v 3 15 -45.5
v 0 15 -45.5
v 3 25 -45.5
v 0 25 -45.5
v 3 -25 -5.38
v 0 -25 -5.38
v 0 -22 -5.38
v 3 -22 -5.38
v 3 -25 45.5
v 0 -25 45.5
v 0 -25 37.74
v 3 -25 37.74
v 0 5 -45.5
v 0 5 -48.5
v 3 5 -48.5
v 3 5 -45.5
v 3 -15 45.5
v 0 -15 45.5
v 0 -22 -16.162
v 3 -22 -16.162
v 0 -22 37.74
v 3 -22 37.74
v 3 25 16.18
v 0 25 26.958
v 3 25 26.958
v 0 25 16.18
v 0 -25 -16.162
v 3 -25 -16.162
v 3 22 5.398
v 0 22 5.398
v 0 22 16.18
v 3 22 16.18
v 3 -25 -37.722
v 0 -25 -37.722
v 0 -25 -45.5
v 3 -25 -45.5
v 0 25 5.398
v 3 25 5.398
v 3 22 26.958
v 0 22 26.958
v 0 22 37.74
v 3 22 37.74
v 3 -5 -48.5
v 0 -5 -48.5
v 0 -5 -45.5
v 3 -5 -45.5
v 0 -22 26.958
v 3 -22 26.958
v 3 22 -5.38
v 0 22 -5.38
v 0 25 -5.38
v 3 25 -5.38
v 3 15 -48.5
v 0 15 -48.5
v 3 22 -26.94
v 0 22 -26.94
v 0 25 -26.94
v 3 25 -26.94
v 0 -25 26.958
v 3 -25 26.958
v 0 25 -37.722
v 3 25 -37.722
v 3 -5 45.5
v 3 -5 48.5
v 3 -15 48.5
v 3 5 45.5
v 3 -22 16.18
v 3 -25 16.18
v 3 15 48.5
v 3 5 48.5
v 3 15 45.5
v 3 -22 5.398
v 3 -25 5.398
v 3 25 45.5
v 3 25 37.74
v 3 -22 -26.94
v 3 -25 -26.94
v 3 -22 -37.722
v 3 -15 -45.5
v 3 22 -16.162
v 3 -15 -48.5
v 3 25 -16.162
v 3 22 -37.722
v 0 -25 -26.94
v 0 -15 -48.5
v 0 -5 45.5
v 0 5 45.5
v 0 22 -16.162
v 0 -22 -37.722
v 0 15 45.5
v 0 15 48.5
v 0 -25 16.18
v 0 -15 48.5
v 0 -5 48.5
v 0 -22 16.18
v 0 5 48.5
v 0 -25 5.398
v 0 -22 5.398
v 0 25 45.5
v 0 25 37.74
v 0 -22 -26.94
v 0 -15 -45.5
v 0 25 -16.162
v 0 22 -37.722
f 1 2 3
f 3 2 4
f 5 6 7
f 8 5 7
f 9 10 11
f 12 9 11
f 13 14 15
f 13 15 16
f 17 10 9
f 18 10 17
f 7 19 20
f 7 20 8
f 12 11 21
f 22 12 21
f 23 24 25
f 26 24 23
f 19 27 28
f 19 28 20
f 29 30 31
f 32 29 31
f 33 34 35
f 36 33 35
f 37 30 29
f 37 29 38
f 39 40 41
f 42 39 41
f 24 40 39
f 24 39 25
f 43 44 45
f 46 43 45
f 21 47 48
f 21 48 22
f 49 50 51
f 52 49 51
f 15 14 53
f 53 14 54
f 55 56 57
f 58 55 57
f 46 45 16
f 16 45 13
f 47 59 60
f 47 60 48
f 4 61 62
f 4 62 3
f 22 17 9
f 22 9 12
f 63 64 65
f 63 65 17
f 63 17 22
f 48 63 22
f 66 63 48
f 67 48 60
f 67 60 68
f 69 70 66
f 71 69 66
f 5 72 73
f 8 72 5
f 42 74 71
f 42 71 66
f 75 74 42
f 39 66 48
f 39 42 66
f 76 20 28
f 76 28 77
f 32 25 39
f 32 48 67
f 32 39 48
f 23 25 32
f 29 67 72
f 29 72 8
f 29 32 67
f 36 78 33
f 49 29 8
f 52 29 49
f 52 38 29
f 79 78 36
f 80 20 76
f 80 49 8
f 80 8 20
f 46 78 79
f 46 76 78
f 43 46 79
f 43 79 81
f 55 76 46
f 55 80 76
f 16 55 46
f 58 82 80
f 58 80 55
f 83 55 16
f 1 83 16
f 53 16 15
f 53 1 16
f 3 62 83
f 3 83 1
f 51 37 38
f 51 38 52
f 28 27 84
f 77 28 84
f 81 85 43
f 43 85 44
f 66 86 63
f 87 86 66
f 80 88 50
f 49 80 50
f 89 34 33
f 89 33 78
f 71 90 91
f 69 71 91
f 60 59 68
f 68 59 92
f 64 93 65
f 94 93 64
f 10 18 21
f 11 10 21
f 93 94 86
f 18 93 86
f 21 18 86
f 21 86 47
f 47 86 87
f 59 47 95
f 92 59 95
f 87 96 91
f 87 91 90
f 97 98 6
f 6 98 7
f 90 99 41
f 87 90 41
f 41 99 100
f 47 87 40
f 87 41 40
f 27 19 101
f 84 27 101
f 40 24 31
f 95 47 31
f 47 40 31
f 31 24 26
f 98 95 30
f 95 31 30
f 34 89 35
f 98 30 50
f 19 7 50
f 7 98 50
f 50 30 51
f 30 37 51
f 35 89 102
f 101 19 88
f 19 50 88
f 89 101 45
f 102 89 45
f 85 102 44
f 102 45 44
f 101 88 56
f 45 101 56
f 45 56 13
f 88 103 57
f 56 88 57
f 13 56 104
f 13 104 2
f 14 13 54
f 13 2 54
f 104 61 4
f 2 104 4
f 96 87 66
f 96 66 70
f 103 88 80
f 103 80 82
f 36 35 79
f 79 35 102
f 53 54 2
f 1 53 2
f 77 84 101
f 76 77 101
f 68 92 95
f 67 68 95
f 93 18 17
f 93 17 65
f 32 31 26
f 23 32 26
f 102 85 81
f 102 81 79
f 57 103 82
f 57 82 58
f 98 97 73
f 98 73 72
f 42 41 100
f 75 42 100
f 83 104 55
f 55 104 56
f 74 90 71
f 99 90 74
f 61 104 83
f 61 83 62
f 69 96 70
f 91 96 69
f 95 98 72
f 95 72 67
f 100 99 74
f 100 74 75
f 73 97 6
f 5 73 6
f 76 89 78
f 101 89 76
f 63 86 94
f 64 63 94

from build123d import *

# Parameters (mm, degrees)
ESBO_O1_W                = 97
ESBO_O1_H                = 50
RESSALTO_EXTRUS_O1_DEPTH = 3
CORTE_EXTRUS_O1_REACH    = 56.647
ESBO_O2_W                = 10.782222222
ESBO_O2_H                = 3
CORTE_EXTRUS_O2_REACH    = 56.647
ESBO_O4_W                = 3
ESBO_O4_H                = 10


with BuildPart() as part:
    # Esboço1 → Ressalto-extrusão1 (new body)
    with BuildSketch(Plane(origin=(0, 0, 0), x_dir=(0, 0, -1), z_dir=(1, 0, 0))):
        Rectangle(ESBO_O1_W, ESBO_O1_H)
    extrude(amount=RESSALTO_EXTRUS_O1_DEPTH)

    # Esboço2 → Corte-extrusão1 (cut, up to next)
    with BuildSketch(Plane.ZY, mode=Mode.PRIVATE) as corte_extrus_o1_sk1:
        with Locations((-10.771111111, 23.5)):
            Rectangle(ESBO_O2_W, ESBO_O2_H)
    corte_extrus_o1_tool1 = extrude(corte_extrus_o1_sk1.sketch, amount=-CORTE_EXTRUS_O1_REACH, mode=Mode.PRIVATE) & part.part
    # Esboço2 → Corte-extrusão1 (cut, up to next)
    with BuildSketch(Plane.ZY, mode=Mode.PRIVATE) as corte_extrus_o1_sk2:
        with Locations((-32.331111111, 23.5)):
            Rectangle(ESBO_O2_W, ESBO_O2_H)
    corte_extrus_o1_tool2 = extrude(corte_extrus_o1_sk2.sketch, amount=-CORTE_EXTRUS_O1_REACH, mode=Mode.PRIVATE) & part.part
    # Esboço2 → Corte-extrusão1 (cut, up to next)
    with BuildSketch(Plane.ZY, mode=Mode.PRIVATE) as corte_extrus_o1_sk3:
        with Locations((10.788888889, 23.5)):
            Rectangle(ESBO_O2_W, ESBO_O2_H)
    corte_extrus_o1_tool3 = extrude(corte_extrus_o1_sk3.sketch, amount=-CORTE_EXTRUS_O1_REACH, mode=Mode.PRIVATE) & part.part
    # Esboço2 → Corte-extrusão1 (cut, up to next)
    with BuildSketch(Plane.ZY, mode=Mode.PRIVATE) as corte_extrus_o1_sk4:
        with Locations((32.348888889, 23.5)):
            Rectangle(ESBO_O2_W, ESBO_O2_H)
    corte_extrus_o1_tool4 = extrude(corte_extrus_o1_sk4.sketch, amount=-CORTE_EXTRUS_O1_REACH, mode=Mode.PRIVATE) & part.part
    # Esboço2 → Corte-extrusão1 (cut, up to next)
    with BuildSketch(Plane.ZY, mode=Mode.PRIVATE) as corte_extrus_o1_sk5:
        with Locations((-32.331111111, -23.5)):
            Rectangle(ESBO_O2_W, ESBO_O2_H)
    corte_extrus_o1_tool5 = extrude(corte_extrus_o1_sk5.sketch, amount=-CORTE_EXTRUS_O1_REACH, mode=Mode.PRIVATE) & part.part
    # Esboço2 → Corte-extrusão1 (cut, up to next)
    with BuildSketch(Plane.ZY, mode=Mode.PRIVATE) as corte_extrus_o1_sk6:
        with Locations((32.348888889, -23.5)):
            Rectangle(ESBO_O2_W, ESBO_O2_H)
    corte_extrus_o1_tool6 = extrude(corte_extrus_o1_sk6.sketch, amount=-CORTE_EXTRUS_O1_REACH, mode=Mode.PRIVATE) & part.part
    # Esboço2 → Corte-extrusão1 (cut, up to next)
    with BuildSketch(Plane.ZY, mode=Mode.PRIVATE) as corte_extrus_o1_sk7:
        with Locations((-10.771111111, -23.5)):
            Rectangle(ESBO_O2_W, ESBO_O2_H)
    corte_extrus_o1_tool7 = extrude(corte_extrus_o1_sk7.sketch, amount=-CORTE_EXTRUS_O1_REACH, mode=Mode.PRIVATE) & part.part
    # Esboço2 → Corte-extrusão1 (cut, up to next)
    with BuildSketch(Plane.ZY, mode=Mode.PRIVATE) as corte_extrus_o1_sk8:
        with Locations((10.788888889, -23.5)):
            Rectangle(ESBO_O2_W, ESBO_O2_H)
    corte_extrus_o1_tool8 = extrude(corte_extrus_o1_sk8.sketch, amount=-CORTE_EXTRUS_O1_REACH, mode=Mode.PRIVATE) & part.part
    add(corte_extrus_o1_tool1.solids().sort_by_distance((0, 23.5, -10.771111))[0], mode=Mode.SUBTRACT)
    add(corte_extrus_o1_tool2.solids().sort_by_distance((0, 23.5, -32.331111))[0], mode=Mode.SUBTRACT)
    add(corte_extrus_o1_tool3.solids().sort_by_distance((0, 23.5, 10.788889))[0], mode=Mode.SUBTRACT)
    add(corte_extrus_o1_tool4.solids().sort_by_distance((0, 23.5, 32.348889))[0], mode=Mode.SUBTRACT)
    add(corte_extrus_o1_tool5.solids().sort_by_distance((0, -23.5, -32.331111))[0], mode=Mode.SUBTRACT)
    add(corte_extrus_o1_tool6.solids().sort_by_distance((0, -23.5, 32.348889))[0], mode=Mode.SUBTRACT)
    add(corte_extrus_o1_tool7.solids().sort_by_distance((0, -23.5, -10.771111))[0], mode=Mode.SUBTRACT)
    add(corte_extrus_o1_tool8.solids().sort_by_distance((0, -23.5, 10.788889))[0], mode=Mode.SUBTRACT)

    # Esboço4 → Corte-extrusão2 (cut, up to next)
    with BuildSketch(Plane.ZY, mode=Mode.PRIVATE) as corte_extrus_o2_sk1:
        with Locations((47, 20)):
            Rectangle(ESBO_O4_W, ESBO_O4_H)
    corte_extrus_o2_tool1 = extrude(corte_extrus_o2_sk1.sketch, amount=-CORTE_EXTRUS_O2_REACH, mode=Mode.PRIVATE) & part.part
    # Esboço4 → Corte-extrusão2 (cut, up to next)
    with BuildSketch(Plane.ZY, mode=Mode.PRIVATE) as corte_extrus_o2_sk2:
        with Locations((47, -20)):
            Rectangle(ESBO_O4_W, ESBO_O4_H)
    corte_extrus_o2_tool2 = extrude(corte_extrus_o2_sk2.sketch, amount=-CORTE_EXTRUS_O2_REACH, mode=Mode.PRIVATE) & part.part
    # Esboço4 → Corte-extrusão2 (cut, up to next)
    with BuildSketch(Plane.ZY, mode=Mode.PRIVATE) as corte_extrus_o2_sk3:
        with Locations((-47, 0)):
            Rectangle(ESBO_O4_W, ESBO_O4_H)
    corte_extrus_o2_tool3 = extrude(corte_extrus_o2_sk3.sketch, amount=-CORTE_EXTRUS_O2_REACH, mode=Mode.PRIVATE) & part.part
    # Esboço4 → Corte-extrusão2 (cut, up to next)
    with BuildSketch(Plane.ZY, mode=Mode.PRIVATE) as corte_extrus_o2_sk4:
        with Locations((-47, 20)):
            Rectangle(ESBO_O4_W, ESBO_O4_H)
    corte_extrus_o2_tool4 = extrude(corte_extrus_o2_sk4.sketch, amount=-CORTE_EXTRUS_O2_REACH, mode=Mode.PRIVATE) & part.part
    # Esboço4 → Corte-extrusão2 (cut, up to next)
    with BuildSketch(Plane.ZY, mode=Mode.PRIVATE) as corte_extrus_o2_sk5:
        with Locations((47, 0)):
            Rectangle(ESBO_O4_W, ESBO_O4_H)
    corte_extrus_o2_tool5 = extrude(corte_extrus_o2_sk5.sketch, amount=-CORTE_EXTRUS_O2_REACH, mode=Mode.PRIVATE) & part.part
    # Esboço4 → Corte-extrusão2 (cut, up to next)
    with BuildSketch(Plane.ZY, mode=Mode.PRIVATE) as corte_extrus_o2_sk6:
        with Locations((-47, -20)):
            Rectangle(ESBO_O4_W, ESBO_O4_H)
    corte_extrus_o2_tool6 = extrude(corte_extrus_o2_sk6.sketch, amount=-CORTE_EXTRUS_O2_REACH, mode=Mode.PRIVATE) & part.part
    add(corte_extrus_o2_tool1.solids().sort_by_distance((0, 20, 47))[0], mode=Mode.SUBTRACT)
    add(corte_extrus_o2_tool2.solids().sort_by_distance((0, -20, 47))[0], mode=Mode.SUBTRACT)
    add(corte_extrus_o2_tool3.solids().sort_by_distance((0, 0, -47))[0], mode=Mode.SUBTRACT)
    add(corte_extrus_o2_tool4.solids().sort_by_distance((0, 20, -47))[0], mode=Mode.SUBTRACT)
    add(corte_extrus_o2_tool5.solids().sort_by_distance((0, 0, 47))[0], mode=Mode.SUBTRACT)
    add(corte_extrus_o2_tool6.solids().sort_by_distance((0, -20, -47))[0], mode=Mode.SUBTRACT)


solid = part.part
